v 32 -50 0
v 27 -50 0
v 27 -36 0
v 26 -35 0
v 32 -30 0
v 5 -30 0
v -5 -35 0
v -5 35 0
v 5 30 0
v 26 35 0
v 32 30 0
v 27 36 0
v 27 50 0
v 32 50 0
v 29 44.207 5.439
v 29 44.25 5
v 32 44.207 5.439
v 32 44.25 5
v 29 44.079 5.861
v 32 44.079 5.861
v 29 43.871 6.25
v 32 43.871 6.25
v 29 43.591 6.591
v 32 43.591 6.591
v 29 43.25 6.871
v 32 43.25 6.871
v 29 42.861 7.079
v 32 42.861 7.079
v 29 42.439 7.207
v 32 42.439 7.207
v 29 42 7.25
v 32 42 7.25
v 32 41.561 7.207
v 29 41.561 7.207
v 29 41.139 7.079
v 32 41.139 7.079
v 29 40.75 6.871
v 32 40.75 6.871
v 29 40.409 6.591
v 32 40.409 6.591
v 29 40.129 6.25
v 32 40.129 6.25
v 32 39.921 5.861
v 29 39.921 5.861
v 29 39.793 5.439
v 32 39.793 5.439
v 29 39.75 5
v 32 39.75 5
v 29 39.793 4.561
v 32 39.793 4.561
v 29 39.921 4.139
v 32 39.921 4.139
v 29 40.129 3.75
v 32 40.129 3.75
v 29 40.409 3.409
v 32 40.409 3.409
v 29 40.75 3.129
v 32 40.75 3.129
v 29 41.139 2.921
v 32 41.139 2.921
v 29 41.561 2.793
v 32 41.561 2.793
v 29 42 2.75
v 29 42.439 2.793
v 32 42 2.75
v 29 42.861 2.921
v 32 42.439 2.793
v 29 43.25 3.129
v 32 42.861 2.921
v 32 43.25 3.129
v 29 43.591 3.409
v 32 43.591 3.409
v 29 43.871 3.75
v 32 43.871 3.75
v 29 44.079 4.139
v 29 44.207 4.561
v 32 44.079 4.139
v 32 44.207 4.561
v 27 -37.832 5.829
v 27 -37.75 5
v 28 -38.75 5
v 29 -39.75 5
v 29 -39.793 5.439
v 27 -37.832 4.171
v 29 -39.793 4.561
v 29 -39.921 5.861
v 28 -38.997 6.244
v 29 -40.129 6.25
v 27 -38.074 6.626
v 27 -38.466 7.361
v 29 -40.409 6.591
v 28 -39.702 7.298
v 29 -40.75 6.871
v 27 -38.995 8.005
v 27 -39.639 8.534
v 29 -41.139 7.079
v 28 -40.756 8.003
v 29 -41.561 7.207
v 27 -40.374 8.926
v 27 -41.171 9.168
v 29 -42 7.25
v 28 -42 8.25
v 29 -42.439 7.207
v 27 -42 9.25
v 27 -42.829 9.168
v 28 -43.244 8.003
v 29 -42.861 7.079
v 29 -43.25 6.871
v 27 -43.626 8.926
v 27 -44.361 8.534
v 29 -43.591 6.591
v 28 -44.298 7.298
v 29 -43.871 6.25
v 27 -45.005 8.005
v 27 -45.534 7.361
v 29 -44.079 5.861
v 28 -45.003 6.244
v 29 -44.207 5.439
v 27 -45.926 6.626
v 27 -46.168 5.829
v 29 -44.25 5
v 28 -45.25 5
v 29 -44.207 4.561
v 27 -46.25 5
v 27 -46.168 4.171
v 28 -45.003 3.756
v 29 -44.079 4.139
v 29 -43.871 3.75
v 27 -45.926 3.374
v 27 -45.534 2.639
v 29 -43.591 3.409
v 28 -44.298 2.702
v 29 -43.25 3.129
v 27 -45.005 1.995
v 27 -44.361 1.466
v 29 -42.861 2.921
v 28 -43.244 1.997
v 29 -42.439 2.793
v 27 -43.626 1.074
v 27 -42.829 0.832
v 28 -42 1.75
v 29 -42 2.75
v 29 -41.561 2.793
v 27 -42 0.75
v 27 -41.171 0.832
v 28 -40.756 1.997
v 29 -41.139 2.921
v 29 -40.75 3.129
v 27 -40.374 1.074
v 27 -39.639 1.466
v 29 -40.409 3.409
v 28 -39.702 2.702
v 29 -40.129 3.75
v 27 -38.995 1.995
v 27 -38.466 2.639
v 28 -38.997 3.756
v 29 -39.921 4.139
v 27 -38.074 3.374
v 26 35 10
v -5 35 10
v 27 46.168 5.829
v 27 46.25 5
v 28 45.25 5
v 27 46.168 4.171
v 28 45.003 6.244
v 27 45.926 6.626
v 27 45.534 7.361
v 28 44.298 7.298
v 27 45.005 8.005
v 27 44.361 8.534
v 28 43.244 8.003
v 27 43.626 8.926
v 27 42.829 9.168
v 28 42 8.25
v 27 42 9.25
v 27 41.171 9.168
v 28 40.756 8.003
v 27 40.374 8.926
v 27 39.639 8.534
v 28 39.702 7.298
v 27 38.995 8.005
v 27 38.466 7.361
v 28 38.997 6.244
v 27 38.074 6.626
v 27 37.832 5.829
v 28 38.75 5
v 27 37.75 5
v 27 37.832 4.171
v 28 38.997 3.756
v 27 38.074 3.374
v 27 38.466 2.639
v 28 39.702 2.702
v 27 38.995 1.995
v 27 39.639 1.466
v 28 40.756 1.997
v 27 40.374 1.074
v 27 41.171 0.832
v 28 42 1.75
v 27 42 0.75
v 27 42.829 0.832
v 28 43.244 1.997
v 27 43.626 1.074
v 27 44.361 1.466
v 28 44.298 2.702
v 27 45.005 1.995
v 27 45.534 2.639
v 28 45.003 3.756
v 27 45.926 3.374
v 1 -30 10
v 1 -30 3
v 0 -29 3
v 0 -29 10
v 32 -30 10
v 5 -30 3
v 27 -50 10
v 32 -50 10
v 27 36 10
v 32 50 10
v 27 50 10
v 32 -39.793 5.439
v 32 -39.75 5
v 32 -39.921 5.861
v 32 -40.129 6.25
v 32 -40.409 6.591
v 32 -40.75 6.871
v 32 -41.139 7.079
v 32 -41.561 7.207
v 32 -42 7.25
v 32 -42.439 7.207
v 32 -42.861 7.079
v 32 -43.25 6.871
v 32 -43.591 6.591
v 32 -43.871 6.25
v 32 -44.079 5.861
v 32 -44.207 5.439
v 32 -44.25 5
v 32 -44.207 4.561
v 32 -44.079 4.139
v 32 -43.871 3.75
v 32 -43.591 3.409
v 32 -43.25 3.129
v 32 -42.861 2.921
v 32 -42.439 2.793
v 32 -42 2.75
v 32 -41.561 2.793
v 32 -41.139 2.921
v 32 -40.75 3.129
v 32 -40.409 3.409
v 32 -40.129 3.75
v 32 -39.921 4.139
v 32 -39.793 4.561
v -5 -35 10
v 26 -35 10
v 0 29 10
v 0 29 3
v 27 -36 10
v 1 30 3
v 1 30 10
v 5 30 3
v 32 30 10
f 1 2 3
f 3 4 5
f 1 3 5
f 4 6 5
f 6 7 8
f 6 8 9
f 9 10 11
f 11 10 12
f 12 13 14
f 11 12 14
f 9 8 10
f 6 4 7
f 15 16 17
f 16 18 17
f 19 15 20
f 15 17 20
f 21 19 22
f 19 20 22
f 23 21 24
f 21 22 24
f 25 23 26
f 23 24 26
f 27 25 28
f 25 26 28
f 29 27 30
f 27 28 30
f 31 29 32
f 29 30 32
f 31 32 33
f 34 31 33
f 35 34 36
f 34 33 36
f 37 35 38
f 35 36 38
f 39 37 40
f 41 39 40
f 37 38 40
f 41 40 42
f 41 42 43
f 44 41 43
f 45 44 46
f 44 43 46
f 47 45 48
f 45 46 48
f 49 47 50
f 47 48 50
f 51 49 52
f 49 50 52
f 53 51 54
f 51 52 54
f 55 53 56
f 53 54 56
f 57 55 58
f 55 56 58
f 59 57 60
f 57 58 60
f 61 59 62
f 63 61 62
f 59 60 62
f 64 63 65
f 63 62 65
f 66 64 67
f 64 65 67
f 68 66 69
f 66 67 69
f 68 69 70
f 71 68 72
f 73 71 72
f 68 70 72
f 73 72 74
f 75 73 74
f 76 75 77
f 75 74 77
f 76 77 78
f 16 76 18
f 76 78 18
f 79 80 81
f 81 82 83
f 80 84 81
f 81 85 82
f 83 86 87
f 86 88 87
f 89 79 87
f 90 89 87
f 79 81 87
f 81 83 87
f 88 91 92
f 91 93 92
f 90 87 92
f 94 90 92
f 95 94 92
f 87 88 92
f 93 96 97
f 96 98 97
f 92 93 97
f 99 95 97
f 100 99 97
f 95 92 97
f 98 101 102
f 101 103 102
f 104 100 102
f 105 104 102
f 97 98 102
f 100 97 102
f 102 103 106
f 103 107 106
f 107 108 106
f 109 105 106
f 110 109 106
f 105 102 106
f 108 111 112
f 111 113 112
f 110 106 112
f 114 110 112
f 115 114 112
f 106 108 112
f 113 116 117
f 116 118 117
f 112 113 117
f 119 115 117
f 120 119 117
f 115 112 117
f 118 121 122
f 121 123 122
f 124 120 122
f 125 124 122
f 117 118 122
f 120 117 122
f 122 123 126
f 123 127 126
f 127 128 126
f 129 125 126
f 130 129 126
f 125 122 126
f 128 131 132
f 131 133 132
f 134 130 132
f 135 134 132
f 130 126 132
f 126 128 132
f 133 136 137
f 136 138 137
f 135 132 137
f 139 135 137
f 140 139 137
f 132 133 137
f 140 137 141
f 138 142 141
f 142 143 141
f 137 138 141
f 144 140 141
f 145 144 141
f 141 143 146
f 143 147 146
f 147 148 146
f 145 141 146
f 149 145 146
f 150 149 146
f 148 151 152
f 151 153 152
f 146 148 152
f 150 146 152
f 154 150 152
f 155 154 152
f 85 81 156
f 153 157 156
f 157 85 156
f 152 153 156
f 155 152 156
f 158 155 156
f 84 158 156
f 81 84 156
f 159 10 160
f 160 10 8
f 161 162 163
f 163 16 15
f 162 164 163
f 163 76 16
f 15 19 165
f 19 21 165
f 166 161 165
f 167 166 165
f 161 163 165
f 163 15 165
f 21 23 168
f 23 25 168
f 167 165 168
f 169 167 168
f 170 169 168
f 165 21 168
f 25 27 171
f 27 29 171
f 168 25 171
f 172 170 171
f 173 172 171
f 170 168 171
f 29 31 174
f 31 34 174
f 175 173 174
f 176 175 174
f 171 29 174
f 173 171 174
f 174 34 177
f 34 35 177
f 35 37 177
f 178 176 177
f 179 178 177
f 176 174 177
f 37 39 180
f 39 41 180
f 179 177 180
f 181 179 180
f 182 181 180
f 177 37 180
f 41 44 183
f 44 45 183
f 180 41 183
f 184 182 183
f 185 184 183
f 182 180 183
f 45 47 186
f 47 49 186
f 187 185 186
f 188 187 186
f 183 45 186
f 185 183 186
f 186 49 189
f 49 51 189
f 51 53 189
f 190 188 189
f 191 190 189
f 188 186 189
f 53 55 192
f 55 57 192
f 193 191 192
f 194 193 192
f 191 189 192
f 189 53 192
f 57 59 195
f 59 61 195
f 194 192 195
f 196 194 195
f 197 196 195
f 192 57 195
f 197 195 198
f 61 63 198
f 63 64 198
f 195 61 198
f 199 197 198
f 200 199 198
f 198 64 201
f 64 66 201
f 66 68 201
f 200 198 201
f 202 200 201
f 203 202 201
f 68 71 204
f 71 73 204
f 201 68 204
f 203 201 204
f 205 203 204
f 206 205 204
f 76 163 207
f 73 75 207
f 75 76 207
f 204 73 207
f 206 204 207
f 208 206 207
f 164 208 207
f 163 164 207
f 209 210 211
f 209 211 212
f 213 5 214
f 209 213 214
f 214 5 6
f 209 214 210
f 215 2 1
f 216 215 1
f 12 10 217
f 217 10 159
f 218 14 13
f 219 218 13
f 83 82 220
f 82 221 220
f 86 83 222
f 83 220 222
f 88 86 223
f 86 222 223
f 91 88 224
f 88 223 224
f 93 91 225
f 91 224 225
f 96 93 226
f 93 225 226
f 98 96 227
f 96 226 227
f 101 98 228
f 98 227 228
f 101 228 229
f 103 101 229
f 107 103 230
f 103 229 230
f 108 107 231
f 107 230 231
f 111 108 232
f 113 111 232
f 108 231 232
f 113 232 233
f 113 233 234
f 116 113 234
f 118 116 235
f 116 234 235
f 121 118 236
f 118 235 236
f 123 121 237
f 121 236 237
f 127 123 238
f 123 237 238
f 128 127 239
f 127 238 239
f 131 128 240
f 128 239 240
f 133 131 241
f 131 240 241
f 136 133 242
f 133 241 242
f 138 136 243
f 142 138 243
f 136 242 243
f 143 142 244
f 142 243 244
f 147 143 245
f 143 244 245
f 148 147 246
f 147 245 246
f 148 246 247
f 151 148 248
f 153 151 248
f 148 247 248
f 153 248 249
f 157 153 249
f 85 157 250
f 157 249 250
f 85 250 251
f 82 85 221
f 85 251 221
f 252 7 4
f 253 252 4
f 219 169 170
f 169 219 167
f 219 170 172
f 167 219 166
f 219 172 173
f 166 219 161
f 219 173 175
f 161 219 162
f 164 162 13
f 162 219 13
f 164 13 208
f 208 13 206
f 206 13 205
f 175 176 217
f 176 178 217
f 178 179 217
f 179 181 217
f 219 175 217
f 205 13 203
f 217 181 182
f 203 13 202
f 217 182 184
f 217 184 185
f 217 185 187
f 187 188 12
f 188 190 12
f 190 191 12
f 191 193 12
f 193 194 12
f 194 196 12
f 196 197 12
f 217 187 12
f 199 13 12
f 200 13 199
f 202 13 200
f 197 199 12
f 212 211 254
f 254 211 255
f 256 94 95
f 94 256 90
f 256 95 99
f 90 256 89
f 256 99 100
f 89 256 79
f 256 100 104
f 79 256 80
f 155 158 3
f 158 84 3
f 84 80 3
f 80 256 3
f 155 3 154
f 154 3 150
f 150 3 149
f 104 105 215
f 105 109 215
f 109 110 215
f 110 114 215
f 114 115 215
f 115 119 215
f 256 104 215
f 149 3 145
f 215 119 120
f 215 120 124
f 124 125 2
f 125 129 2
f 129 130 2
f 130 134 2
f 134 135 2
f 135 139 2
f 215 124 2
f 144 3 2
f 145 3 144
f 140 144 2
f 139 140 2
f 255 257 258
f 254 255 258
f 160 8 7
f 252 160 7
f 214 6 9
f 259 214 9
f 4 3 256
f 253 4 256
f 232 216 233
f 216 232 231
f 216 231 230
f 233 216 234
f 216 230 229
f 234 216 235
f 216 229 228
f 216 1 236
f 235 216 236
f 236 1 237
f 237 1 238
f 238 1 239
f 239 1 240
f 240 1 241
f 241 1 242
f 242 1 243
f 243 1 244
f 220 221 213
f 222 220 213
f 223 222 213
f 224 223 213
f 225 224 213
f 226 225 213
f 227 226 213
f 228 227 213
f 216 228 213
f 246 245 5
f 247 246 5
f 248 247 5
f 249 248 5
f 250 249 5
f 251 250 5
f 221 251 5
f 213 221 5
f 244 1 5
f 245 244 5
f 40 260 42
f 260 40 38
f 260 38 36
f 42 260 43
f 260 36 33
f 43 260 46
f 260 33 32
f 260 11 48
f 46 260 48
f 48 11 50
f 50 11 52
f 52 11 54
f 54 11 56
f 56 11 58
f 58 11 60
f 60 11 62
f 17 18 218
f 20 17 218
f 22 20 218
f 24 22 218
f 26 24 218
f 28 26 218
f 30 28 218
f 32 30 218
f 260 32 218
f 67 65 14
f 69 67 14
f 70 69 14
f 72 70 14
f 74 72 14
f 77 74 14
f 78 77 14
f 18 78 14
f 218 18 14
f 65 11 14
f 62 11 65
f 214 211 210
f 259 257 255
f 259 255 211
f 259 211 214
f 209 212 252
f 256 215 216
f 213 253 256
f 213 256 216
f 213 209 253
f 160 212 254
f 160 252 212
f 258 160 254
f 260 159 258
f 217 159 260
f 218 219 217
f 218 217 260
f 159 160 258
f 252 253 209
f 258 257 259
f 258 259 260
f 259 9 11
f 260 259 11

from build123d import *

# Parameters (mm, degrees)
F1_DEPTH       = 10
F2_SIZE        = 1
F5_D           = 4.5
F5_CSINK_D     = 8.5
F5_CSINK_ANGLE = 90
F6_DEPTH       = 3


with BuildPart() as f1:
    # F0 (on Top) → F1 (new body)
    with BuildSketch(Plane.XY):
        Polygon((0, -30), (0, 0), (0, 30), (5, 30), (32, 30), (32, 50), (27, 50), (27, 35), (-5, 35), (-5, 0), (-5, -35), (27, -35), (27, -50), (32, -50), (32, -30), (5, -30), align=None)
    extrude(amount=F1_DEPTH)

    # F2
    f2_edges = [f1.edges().sort_by_distance(p)[0] for p in [
        (0, -30, 5),
        (27, -35, 5),
        (0, 30, 5),
        (27, 35, 5),
    ]]
    chamfer(f2_edges, length=F2_SIZE)

    # F5 (through all)
    with Locations(Plane(origin=(27, 0, 0), x_dir=(0, -1, 0), z_dir=(-1, 0, 0))):
        with Locations((42, 5), (-42, 5)):
            CounterSinkHole(F5_D / 2, F5_CSINK_D / 2, counter_sink_angle=F5_CSINK_ANGLE)

    # F0 (on Top) → F6 (join)
    with BuildSketch(Plane.XY):
        Polygon((0, 30), (0, 0), (0, -30), (5, -30), (5, 30), align=None)
    extrude(amount=F6_DEPTH)


solid = f1.part
